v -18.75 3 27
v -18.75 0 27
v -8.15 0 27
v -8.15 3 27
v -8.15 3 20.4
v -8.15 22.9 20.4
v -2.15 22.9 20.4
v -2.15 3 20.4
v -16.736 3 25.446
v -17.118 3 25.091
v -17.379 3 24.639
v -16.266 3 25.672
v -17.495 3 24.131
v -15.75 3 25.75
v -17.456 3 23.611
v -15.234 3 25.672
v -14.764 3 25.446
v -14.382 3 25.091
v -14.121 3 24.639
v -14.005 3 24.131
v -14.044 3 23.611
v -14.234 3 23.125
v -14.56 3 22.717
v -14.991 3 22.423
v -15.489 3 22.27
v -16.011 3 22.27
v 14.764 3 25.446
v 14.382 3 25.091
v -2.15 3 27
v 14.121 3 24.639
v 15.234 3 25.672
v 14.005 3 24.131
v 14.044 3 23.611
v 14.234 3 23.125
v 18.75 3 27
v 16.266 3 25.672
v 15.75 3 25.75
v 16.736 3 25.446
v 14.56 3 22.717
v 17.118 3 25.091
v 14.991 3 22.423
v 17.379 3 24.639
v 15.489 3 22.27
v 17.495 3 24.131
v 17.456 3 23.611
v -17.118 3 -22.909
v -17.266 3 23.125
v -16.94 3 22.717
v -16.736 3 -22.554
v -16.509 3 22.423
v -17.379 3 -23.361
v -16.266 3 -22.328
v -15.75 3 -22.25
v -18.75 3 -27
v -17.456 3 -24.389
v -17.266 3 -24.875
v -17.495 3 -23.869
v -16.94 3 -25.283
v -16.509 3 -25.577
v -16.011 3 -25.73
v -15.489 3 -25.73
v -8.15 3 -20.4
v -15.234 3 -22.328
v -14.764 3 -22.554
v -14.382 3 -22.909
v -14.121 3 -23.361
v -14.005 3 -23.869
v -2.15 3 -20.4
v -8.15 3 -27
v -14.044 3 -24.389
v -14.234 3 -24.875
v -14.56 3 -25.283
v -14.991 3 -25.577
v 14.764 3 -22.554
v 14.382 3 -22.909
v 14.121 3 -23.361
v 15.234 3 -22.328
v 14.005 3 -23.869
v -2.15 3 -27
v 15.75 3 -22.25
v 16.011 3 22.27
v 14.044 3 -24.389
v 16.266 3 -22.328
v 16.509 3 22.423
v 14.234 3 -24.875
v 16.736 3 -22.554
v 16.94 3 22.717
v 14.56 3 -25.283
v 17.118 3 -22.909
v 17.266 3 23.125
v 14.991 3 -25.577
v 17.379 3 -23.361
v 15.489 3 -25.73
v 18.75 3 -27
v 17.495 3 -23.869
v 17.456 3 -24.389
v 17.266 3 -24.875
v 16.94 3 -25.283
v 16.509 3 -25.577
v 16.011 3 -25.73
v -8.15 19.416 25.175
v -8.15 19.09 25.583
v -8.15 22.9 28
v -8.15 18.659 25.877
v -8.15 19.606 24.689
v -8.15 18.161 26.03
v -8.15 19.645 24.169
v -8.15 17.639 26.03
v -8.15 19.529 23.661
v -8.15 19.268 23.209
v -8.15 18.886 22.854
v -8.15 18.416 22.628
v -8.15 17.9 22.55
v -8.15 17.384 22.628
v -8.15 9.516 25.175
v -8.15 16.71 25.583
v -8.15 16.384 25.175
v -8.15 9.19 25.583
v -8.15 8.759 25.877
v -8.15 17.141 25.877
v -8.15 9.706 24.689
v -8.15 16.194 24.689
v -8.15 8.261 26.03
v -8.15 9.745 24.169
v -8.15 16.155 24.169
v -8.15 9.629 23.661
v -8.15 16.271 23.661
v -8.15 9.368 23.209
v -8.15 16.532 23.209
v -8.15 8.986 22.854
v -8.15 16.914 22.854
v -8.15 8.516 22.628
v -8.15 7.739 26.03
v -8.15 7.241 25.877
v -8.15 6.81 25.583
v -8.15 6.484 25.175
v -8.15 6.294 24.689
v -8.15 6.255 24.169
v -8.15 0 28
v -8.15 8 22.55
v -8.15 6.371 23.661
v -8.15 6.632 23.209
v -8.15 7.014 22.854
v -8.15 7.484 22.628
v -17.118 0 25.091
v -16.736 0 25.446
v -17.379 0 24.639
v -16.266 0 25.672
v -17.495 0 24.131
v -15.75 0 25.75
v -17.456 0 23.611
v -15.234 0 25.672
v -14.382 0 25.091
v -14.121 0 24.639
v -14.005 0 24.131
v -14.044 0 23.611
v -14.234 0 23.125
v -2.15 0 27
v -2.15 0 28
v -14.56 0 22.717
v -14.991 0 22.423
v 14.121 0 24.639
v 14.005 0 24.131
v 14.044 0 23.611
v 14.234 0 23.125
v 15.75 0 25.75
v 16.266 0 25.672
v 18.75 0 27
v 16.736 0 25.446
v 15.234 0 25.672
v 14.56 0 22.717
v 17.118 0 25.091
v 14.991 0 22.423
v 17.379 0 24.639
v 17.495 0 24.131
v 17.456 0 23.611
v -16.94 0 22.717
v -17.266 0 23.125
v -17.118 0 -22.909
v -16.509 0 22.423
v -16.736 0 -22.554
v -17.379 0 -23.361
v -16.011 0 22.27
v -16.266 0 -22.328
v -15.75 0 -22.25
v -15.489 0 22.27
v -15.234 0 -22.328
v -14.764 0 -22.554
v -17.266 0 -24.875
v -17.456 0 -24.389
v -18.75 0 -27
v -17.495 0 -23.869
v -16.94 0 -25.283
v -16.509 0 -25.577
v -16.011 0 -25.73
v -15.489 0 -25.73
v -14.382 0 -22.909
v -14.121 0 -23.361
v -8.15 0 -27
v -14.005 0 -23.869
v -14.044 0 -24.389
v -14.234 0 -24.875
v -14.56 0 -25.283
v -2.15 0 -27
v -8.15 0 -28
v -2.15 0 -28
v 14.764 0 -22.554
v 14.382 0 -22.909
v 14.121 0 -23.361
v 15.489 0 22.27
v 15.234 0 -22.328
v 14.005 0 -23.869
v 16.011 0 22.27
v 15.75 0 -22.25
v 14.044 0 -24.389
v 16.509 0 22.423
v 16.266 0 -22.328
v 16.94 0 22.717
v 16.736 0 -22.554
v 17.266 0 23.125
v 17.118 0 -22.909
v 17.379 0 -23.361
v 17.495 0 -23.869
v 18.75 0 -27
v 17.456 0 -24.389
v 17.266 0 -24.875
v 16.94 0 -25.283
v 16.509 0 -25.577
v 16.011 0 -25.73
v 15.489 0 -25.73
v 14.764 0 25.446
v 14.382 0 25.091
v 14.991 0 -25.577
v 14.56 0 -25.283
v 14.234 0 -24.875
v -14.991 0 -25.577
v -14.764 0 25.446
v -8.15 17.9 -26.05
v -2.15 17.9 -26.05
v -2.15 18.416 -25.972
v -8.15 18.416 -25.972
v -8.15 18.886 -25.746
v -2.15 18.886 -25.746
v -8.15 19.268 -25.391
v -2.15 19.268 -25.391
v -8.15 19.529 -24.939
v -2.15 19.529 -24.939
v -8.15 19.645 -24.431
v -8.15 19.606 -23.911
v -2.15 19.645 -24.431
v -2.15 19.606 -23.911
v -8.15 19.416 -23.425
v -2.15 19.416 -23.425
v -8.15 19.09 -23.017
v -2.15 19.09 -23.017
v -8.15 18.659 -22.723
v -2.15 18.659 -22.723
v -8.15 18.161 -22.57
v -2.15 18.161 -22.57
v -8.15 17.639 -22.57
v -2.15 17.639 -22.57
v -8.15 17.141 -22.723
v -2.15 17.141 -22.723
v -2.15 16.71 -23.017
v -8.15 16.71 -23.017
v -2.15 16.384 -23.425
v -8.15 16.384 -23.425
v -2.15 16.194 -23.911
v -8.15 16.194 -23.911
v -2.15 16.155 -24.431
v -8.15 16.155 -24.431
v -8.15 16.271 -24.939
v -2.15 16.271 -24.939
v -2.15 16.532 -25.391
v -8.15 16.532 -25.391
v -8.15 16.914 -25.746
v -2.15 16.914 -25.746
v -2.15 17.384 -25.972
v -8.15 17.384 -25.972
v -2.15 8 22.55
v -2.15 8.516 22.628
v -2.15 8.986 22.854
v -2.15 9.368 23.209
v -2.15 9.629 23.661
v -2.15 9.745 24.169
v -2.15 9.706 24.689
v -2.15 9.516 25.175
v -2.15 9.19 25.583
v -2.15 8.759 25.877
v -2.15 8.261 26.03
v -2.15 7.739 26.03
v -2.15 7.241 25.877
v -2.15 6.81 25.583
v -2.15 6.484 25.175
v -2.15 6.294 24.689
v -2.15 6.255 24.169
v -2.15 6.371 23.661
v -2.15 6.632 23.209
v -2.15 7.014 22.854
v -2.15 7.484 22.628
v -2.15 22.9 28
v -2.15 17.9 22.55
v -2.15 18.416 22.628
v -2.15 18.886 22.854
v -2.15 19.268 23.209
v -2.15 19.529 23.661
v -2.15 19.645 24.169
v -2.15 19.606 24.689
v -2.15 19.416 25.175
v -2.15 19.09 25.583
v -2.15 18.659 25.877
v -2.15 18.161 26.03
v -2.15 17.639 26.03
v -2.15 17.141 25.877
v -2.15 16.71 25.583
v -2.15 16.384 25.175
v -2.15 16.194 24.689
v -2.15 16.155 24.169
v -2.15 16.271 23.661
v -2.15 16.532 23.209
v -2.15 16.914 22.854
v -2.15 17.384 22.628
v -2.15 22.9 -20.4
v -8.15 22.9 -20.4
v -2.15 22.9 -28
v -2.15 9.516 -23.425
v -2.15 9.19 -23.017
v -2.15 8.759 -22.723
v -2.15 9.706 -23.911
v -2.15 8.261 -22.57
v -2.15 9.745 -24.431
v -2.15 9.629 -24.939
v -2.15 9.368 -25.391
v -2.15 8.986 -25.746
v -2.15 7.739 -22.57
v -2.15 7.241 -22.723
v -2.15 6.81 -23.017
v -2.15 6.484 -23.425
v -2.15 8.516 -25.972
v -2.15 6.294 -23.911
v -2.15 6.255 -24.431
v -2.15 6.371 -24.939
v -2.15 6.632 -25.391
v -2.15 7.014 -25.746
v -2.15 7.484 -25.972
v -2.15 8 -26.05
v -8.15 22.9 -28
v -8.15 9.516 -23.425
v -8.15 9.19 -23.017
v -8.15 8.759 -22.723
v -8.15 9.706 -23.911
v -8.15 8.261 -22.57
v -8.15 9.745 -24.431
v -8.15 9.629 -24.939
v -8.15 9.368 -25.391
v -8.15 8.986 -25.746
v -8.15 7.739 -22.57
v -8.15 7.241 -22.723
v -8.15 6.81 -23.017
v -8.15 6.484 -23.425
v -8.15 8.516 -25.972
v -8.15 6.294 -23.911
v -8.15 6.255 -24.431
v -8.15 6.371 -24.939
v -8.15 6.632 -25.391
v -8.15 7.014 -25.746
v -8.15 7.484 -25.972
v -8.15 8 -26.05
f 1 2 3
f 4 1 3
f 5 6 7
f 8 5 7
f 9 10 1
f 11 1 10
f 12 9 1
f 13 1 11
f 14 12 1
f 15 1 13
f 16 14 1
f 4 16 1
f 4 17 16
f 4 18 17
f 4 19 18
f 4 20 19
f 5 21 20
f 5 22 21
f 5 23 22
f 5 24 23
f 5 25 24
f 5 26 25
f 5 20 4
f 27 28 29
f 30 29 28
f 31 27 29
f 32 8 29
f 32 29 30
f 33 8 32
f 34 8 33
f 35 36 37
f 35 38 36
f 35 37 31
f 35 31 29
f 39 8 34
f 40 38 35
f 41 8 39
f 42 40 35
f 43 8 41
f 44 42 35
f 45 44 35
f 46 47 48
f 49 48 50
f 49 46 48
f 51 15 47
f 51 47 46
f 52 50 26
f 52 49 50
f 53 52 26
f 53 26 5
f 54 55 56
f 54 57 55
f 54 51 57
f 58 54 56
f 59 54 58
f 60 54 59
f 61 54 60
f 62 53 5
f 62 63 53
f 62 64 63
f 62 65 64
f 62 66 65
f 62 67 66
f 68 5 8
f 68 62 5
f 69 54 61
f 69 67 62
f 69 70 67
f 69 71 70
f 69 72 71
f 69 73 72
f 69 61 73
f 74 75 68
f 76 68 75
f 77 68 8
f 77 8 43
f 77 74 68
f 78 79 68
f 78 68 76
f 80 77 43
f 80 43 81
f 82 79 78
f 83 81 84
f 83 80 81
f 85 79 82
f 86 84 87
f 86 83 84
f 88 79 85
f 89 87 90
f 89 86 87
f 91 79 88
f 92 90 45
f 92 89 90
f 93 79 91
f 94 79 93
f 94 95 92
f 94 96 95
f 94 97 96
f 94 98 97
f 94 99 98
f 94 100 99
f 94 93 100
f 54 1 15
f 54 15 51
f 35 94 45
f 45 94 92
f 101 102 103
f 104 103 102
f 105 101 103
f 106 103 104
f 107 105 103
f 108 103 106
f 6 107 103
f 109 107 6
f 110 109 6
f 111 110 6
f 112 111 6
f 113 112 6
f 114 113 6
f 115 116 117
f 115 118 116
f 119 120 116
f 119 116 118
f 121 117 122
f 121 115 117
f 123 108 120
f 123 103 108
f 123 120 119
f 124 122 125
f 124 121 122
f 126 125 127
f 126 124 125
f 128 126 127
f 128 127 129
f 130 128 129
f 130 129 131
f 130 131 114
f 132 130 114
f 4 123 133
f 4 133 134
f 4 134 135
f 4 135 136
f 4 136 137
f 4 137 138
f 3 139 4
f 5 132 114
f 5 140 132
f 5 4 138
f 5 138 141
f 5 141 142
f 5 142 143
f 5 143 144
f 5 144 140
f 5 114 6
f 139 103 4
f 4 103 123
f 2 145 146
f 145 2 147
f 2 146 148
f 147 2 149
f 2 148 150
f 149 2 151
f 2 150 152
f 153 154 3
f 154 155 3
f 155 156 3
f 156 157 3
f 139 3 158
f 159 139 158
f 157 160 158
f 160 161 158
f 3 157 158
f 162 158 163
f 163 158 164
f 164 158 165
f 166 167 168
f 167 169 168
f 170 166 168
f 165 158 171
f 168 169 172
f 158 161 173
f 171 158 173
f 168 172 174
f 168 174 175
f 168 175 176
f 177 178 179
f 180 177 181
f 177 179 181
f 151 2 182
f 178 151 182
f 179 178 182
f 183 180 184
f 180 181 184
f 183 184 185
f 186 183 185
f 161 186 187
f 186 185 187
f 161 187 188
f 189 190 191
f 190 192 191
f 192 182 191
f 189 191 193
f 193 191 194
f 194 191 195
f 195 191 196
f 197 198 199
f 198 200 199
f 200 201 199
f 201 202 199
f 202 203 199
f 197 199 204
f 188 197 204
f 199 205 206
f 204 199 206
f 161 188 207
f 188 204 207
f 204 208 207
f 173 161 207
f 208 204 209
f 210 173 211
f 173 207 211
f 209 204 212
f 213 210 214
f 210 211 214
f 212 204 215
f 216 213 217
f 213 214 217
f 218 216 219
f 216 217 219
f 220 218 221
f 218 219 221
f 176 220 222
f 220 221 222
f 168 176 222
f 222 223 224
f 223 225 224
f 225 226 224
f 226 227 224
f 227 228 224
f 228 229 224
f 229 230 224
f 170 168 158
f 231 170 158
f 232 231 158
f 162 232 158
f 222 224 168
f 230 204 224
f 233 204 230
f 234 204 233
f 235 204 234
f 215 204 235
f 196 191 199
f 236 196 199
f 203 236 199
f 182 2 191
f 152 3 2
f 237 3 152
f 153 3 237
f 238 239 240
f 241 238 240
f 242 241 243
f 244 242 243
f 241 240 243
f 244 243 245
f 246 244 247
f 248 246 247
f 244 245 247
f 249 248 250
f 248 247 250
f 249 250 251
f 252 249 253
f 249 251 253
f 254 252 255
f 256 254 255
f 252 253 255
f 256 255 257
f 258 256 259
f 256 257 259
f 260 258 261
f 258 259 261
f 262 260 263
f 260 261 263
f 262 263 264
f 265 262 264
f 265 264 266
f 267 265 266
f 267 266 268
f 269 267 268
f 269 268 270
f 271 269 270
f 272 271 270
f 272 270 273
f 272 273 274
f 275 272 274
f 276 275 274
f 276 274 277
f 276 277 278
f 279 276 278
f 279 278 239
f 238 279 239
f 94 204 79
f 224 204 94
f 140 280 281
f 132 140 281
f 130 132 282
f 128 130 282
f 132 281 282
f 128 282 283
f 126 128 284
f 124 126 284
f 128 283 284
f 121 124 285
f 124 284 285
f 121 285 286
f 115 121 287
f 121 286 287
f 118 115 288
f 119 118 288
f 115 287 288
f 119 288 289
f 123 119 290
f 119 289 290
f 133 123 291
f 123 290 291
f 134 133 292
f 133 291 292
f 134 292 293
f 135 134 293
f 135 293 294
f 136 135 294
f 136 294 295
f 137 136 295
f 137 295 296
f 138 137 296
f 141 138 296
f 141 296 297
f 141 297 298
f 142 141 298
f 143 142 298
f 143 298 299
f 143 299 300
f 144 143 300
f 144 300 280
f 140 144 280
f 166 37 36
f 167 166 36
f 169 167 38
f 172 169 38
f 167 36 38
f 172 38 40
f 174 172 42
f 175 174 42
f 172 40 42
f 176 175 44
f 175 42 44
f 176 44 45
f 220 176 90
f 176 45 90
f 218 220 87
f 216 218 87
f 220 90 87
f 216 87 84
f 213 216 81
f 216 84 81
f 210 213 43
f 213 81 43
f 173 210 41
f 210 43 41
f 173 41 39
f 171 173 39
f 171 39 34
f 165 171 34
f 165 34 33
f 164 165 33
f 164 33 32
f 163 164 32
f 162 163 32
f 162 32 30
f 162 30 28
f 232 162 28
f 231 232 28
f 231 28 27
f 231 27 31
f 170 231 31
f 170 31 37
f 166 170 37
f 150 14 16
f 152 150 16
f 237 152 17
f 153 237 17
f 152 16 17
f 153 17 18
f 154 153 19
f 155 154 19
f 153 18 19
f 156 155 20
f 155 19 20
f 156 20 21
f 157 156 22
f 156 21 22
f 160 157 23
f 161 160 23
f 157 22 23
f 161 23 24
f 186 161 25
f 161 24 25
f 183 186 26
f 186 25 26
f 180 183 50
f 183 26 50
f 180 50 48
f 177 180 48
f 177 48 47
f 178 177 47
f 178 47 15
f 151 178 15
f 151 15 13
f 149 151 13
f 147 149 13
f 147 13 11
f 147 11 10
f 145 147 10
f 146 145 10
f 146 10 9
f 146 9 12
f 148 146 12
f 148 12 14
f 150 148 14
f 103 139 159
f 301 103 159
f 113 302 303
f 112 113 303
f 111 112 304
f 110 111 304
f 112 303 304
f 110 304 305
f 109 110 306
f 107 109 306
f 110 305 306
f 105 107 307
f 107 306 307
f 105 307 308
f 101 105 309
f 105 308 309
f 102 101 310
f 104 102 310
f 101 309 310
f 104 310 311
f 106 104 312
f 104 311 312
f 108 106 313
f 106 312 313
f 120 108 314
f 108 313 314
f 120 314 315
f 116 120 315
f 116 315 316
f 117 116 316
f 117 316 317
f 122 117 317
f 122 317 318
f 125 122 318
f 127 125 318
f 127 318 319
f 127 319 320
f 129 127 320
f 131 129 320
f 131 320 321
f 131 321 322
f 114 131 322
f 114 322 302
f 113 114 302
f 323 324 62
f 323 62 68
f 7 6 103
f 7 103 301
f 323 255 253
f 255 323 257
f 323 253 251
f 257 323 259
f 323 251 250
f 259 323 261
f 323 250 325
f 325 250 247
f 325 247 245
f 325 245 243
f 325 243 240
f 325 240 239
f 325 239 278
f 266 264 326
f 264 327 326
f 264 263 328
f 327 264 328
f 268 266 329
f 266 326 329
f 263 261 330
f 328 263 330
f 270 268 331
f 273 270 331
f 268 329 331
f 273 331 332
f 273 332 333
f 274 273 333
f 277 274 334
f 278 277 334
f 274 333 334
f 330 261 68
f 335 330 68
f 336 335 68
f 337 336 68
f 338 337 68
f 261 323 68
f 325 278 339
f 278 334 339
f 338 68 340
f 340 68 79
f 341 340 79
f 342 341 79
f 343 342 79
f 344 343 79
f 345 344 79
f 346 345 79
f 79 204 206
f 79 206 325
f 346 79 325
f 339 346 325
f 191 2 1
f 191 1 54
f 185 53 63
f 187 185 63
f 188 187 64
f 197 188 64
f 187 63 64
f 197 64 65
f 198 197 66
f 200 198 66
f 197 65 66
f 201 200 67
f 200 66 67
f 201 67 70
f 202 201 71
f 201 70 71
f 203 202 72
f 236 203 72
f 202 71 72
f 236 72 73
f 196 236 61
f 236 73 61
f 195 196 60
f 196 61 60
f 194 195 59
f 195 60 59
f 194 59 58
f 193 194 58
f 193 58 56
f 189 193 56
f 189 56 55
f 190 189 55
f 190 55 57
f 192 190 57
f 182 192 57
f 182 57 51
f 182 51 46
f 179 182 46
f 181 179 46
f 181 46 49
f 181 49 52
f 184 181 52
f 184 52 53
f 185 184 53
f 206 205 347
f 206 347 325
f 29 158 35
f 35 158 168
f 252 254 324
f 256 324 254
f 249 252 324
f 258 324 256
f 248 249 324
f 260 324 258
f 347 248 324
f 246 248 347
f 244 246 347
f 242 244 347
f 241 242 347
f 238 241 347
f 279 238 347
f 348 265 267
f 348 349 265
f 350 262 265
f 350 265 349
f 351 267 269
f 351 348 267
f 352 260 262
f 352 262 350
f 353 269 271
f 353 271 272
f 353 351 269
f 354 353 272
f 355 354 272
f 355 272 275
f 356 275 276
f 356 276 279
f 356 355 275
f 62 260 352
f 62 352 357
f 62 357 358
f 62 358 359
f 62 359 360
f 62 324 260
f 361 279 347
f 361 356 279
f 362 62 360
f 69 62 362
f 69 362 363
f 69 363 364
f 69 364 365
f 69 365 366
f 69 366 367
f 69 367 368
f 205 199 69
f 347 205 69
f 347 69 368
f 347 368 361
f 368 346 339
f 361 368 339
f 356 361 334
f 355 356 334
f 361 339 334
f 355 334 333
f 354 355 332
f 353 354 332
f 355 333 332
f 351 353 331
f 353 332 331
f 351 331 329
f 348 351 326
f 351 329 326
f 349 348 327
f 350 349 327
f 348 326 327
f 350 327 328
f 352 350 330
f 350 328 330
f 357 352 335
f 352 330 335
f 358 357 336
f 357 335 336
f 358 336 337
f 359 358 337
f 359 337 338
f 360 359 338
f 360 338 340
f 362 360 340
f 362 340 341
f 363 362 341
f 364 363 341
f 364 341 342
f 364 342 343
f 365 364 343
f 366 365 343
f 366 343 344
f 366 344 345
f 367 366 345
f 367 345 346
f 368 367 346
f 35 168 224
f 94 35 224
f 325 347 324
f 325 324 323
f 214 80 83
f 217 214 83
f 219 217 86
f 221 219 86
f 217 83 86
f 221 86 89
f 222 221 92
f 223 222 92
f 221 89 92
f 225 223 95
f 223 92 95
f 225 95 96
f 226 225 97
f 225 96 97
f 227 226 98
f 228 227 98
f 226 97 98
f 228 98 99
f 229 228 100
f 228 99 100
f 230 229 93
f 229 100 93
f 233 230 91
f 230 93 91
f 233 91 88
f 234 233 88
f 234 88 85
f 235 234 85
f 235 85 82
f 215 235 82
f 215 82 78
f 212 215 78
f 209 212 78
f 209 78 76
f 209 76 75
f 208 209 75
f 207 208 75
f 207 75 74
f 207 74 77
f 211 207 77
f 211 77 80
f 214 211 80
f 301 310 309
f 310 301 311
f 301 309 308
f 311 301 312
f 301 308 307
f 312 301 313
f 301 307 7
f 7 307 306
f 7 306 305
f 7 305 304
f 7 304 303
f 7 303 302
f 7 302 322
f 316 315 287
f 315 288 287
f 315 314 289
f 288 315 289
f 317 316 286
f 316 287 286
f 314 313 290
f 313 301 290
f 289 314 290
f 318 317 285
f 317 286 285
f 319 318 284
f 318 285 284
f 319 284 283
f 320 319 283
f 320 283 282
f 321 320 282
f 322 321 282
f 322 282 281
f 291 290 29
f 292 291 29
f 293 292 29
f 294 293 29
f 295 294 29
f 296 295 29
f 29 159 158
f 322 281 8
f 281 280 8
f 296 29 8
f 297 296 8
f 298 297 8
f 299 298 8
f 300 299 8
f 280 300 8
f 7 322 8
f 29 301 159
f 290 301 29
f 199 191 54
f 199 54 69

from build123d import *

# Parameters (mm, degrees)
SKETCH_1_W           = 37.5
SKETCH_1_H           = 54
EXTRUDE_1_DEPTH      = 3
EXTRUDE_2_DEPTH      = 19.9
EXTRUDE_2_DEPTH_BACK = 3
SKETCH_2_W           = 6
SKETCH_2_H           = 7.6
SKETCH_3_R           = 1.75
CUT_EXTRUDE_1_DEPTH  = 42.775830333
SKETCH_4_R           = 1.75
CUT_EXTRUDE_2_DEPTH  = 40.135310143


with BuildPart() as part:
    # 草图1 → 凸台-拉伸1 (new body)
    with BuildSketch(Plane(origin=(0, 0, 0), x_dir=(1, 0, 0), z_dir=(0, 1, 0))):
        Rectangle(SKETCH_1_W, SKETCH_1_H)
    extrude(amount=EXTRUDE_1_DEPTH)

    # 草图2 → 凸台-拉伸2 (add, two sides: drawn at the far end of the back side and taken through both)
    with BuildSketch(Plane(origin=(0, 3, 0), x_dir=(1, 0, 0), z_dir=(0, 1, 0)).offset(-EXTRUDE_2_DEPTH_BACK)):
        with Locations((-5.15, -24.2)):
            Rectangle(SKETCH_2_W, SKETCH_2_H)
        with Locations((-5.15, 24.2)):
            Rectangle(SKETCH_2_W, SKETCH_2_H)
    extrude(amount=EXTRUDE_2_DEPTH + EXTRUDE_2_DEPTH_BACK)

    # 草图3 → 切除-拉伸1 (cut, through all)
    with BuildSketch(Plane(origin=(-2.15, 0, 0), x_dir=(0, 0, -1), z_dir=(1, 0, 0))):
        with Locations((-24.3, 17.9)):
            Circle(SKETCH_3_R)
        with Locations((-24.3, 8)):
            Circle(SKETCH_3_R)
        with Locations((24.3, 8)):
            Circle(SKETCH_3_R)
        with Locations((24.3, 17.9)):
            Circle(SKETCH_3_R)
    extrude(amount=-CUT_EXTRUDE_1_DEPTH, mode=Mode.SUBTRACT)

    # 草图4 → 切除-拉伸2 (cut, through all)
    with BuildSketch(Plane(origin=(0, 3, 0), x_dir=(1, 0, 0), z_dir=(0, 1, 0))):
        with Locations(Location((-15.75, 24, 0), (0, 0, 270))):
            Circle(SKETCH_4_R)
        with Locations(Location((-15.75, -24, 0), (0, 0, 270))):
            Circle(SKETCH_4_R)
        with Locations(Location((15.75, -24, 0), (0, 0, 270))):
            Circle(SKETCH_4_R)
        with Locations(Location((15.75, 24, 0), (0, 0, 270))):
            Circle(SKETCH_4_R)
    extrude(amount=-CUT_EXTRUDE_2_DEPTH, mode=Mode.SUBTRACT)


solid = part.part
